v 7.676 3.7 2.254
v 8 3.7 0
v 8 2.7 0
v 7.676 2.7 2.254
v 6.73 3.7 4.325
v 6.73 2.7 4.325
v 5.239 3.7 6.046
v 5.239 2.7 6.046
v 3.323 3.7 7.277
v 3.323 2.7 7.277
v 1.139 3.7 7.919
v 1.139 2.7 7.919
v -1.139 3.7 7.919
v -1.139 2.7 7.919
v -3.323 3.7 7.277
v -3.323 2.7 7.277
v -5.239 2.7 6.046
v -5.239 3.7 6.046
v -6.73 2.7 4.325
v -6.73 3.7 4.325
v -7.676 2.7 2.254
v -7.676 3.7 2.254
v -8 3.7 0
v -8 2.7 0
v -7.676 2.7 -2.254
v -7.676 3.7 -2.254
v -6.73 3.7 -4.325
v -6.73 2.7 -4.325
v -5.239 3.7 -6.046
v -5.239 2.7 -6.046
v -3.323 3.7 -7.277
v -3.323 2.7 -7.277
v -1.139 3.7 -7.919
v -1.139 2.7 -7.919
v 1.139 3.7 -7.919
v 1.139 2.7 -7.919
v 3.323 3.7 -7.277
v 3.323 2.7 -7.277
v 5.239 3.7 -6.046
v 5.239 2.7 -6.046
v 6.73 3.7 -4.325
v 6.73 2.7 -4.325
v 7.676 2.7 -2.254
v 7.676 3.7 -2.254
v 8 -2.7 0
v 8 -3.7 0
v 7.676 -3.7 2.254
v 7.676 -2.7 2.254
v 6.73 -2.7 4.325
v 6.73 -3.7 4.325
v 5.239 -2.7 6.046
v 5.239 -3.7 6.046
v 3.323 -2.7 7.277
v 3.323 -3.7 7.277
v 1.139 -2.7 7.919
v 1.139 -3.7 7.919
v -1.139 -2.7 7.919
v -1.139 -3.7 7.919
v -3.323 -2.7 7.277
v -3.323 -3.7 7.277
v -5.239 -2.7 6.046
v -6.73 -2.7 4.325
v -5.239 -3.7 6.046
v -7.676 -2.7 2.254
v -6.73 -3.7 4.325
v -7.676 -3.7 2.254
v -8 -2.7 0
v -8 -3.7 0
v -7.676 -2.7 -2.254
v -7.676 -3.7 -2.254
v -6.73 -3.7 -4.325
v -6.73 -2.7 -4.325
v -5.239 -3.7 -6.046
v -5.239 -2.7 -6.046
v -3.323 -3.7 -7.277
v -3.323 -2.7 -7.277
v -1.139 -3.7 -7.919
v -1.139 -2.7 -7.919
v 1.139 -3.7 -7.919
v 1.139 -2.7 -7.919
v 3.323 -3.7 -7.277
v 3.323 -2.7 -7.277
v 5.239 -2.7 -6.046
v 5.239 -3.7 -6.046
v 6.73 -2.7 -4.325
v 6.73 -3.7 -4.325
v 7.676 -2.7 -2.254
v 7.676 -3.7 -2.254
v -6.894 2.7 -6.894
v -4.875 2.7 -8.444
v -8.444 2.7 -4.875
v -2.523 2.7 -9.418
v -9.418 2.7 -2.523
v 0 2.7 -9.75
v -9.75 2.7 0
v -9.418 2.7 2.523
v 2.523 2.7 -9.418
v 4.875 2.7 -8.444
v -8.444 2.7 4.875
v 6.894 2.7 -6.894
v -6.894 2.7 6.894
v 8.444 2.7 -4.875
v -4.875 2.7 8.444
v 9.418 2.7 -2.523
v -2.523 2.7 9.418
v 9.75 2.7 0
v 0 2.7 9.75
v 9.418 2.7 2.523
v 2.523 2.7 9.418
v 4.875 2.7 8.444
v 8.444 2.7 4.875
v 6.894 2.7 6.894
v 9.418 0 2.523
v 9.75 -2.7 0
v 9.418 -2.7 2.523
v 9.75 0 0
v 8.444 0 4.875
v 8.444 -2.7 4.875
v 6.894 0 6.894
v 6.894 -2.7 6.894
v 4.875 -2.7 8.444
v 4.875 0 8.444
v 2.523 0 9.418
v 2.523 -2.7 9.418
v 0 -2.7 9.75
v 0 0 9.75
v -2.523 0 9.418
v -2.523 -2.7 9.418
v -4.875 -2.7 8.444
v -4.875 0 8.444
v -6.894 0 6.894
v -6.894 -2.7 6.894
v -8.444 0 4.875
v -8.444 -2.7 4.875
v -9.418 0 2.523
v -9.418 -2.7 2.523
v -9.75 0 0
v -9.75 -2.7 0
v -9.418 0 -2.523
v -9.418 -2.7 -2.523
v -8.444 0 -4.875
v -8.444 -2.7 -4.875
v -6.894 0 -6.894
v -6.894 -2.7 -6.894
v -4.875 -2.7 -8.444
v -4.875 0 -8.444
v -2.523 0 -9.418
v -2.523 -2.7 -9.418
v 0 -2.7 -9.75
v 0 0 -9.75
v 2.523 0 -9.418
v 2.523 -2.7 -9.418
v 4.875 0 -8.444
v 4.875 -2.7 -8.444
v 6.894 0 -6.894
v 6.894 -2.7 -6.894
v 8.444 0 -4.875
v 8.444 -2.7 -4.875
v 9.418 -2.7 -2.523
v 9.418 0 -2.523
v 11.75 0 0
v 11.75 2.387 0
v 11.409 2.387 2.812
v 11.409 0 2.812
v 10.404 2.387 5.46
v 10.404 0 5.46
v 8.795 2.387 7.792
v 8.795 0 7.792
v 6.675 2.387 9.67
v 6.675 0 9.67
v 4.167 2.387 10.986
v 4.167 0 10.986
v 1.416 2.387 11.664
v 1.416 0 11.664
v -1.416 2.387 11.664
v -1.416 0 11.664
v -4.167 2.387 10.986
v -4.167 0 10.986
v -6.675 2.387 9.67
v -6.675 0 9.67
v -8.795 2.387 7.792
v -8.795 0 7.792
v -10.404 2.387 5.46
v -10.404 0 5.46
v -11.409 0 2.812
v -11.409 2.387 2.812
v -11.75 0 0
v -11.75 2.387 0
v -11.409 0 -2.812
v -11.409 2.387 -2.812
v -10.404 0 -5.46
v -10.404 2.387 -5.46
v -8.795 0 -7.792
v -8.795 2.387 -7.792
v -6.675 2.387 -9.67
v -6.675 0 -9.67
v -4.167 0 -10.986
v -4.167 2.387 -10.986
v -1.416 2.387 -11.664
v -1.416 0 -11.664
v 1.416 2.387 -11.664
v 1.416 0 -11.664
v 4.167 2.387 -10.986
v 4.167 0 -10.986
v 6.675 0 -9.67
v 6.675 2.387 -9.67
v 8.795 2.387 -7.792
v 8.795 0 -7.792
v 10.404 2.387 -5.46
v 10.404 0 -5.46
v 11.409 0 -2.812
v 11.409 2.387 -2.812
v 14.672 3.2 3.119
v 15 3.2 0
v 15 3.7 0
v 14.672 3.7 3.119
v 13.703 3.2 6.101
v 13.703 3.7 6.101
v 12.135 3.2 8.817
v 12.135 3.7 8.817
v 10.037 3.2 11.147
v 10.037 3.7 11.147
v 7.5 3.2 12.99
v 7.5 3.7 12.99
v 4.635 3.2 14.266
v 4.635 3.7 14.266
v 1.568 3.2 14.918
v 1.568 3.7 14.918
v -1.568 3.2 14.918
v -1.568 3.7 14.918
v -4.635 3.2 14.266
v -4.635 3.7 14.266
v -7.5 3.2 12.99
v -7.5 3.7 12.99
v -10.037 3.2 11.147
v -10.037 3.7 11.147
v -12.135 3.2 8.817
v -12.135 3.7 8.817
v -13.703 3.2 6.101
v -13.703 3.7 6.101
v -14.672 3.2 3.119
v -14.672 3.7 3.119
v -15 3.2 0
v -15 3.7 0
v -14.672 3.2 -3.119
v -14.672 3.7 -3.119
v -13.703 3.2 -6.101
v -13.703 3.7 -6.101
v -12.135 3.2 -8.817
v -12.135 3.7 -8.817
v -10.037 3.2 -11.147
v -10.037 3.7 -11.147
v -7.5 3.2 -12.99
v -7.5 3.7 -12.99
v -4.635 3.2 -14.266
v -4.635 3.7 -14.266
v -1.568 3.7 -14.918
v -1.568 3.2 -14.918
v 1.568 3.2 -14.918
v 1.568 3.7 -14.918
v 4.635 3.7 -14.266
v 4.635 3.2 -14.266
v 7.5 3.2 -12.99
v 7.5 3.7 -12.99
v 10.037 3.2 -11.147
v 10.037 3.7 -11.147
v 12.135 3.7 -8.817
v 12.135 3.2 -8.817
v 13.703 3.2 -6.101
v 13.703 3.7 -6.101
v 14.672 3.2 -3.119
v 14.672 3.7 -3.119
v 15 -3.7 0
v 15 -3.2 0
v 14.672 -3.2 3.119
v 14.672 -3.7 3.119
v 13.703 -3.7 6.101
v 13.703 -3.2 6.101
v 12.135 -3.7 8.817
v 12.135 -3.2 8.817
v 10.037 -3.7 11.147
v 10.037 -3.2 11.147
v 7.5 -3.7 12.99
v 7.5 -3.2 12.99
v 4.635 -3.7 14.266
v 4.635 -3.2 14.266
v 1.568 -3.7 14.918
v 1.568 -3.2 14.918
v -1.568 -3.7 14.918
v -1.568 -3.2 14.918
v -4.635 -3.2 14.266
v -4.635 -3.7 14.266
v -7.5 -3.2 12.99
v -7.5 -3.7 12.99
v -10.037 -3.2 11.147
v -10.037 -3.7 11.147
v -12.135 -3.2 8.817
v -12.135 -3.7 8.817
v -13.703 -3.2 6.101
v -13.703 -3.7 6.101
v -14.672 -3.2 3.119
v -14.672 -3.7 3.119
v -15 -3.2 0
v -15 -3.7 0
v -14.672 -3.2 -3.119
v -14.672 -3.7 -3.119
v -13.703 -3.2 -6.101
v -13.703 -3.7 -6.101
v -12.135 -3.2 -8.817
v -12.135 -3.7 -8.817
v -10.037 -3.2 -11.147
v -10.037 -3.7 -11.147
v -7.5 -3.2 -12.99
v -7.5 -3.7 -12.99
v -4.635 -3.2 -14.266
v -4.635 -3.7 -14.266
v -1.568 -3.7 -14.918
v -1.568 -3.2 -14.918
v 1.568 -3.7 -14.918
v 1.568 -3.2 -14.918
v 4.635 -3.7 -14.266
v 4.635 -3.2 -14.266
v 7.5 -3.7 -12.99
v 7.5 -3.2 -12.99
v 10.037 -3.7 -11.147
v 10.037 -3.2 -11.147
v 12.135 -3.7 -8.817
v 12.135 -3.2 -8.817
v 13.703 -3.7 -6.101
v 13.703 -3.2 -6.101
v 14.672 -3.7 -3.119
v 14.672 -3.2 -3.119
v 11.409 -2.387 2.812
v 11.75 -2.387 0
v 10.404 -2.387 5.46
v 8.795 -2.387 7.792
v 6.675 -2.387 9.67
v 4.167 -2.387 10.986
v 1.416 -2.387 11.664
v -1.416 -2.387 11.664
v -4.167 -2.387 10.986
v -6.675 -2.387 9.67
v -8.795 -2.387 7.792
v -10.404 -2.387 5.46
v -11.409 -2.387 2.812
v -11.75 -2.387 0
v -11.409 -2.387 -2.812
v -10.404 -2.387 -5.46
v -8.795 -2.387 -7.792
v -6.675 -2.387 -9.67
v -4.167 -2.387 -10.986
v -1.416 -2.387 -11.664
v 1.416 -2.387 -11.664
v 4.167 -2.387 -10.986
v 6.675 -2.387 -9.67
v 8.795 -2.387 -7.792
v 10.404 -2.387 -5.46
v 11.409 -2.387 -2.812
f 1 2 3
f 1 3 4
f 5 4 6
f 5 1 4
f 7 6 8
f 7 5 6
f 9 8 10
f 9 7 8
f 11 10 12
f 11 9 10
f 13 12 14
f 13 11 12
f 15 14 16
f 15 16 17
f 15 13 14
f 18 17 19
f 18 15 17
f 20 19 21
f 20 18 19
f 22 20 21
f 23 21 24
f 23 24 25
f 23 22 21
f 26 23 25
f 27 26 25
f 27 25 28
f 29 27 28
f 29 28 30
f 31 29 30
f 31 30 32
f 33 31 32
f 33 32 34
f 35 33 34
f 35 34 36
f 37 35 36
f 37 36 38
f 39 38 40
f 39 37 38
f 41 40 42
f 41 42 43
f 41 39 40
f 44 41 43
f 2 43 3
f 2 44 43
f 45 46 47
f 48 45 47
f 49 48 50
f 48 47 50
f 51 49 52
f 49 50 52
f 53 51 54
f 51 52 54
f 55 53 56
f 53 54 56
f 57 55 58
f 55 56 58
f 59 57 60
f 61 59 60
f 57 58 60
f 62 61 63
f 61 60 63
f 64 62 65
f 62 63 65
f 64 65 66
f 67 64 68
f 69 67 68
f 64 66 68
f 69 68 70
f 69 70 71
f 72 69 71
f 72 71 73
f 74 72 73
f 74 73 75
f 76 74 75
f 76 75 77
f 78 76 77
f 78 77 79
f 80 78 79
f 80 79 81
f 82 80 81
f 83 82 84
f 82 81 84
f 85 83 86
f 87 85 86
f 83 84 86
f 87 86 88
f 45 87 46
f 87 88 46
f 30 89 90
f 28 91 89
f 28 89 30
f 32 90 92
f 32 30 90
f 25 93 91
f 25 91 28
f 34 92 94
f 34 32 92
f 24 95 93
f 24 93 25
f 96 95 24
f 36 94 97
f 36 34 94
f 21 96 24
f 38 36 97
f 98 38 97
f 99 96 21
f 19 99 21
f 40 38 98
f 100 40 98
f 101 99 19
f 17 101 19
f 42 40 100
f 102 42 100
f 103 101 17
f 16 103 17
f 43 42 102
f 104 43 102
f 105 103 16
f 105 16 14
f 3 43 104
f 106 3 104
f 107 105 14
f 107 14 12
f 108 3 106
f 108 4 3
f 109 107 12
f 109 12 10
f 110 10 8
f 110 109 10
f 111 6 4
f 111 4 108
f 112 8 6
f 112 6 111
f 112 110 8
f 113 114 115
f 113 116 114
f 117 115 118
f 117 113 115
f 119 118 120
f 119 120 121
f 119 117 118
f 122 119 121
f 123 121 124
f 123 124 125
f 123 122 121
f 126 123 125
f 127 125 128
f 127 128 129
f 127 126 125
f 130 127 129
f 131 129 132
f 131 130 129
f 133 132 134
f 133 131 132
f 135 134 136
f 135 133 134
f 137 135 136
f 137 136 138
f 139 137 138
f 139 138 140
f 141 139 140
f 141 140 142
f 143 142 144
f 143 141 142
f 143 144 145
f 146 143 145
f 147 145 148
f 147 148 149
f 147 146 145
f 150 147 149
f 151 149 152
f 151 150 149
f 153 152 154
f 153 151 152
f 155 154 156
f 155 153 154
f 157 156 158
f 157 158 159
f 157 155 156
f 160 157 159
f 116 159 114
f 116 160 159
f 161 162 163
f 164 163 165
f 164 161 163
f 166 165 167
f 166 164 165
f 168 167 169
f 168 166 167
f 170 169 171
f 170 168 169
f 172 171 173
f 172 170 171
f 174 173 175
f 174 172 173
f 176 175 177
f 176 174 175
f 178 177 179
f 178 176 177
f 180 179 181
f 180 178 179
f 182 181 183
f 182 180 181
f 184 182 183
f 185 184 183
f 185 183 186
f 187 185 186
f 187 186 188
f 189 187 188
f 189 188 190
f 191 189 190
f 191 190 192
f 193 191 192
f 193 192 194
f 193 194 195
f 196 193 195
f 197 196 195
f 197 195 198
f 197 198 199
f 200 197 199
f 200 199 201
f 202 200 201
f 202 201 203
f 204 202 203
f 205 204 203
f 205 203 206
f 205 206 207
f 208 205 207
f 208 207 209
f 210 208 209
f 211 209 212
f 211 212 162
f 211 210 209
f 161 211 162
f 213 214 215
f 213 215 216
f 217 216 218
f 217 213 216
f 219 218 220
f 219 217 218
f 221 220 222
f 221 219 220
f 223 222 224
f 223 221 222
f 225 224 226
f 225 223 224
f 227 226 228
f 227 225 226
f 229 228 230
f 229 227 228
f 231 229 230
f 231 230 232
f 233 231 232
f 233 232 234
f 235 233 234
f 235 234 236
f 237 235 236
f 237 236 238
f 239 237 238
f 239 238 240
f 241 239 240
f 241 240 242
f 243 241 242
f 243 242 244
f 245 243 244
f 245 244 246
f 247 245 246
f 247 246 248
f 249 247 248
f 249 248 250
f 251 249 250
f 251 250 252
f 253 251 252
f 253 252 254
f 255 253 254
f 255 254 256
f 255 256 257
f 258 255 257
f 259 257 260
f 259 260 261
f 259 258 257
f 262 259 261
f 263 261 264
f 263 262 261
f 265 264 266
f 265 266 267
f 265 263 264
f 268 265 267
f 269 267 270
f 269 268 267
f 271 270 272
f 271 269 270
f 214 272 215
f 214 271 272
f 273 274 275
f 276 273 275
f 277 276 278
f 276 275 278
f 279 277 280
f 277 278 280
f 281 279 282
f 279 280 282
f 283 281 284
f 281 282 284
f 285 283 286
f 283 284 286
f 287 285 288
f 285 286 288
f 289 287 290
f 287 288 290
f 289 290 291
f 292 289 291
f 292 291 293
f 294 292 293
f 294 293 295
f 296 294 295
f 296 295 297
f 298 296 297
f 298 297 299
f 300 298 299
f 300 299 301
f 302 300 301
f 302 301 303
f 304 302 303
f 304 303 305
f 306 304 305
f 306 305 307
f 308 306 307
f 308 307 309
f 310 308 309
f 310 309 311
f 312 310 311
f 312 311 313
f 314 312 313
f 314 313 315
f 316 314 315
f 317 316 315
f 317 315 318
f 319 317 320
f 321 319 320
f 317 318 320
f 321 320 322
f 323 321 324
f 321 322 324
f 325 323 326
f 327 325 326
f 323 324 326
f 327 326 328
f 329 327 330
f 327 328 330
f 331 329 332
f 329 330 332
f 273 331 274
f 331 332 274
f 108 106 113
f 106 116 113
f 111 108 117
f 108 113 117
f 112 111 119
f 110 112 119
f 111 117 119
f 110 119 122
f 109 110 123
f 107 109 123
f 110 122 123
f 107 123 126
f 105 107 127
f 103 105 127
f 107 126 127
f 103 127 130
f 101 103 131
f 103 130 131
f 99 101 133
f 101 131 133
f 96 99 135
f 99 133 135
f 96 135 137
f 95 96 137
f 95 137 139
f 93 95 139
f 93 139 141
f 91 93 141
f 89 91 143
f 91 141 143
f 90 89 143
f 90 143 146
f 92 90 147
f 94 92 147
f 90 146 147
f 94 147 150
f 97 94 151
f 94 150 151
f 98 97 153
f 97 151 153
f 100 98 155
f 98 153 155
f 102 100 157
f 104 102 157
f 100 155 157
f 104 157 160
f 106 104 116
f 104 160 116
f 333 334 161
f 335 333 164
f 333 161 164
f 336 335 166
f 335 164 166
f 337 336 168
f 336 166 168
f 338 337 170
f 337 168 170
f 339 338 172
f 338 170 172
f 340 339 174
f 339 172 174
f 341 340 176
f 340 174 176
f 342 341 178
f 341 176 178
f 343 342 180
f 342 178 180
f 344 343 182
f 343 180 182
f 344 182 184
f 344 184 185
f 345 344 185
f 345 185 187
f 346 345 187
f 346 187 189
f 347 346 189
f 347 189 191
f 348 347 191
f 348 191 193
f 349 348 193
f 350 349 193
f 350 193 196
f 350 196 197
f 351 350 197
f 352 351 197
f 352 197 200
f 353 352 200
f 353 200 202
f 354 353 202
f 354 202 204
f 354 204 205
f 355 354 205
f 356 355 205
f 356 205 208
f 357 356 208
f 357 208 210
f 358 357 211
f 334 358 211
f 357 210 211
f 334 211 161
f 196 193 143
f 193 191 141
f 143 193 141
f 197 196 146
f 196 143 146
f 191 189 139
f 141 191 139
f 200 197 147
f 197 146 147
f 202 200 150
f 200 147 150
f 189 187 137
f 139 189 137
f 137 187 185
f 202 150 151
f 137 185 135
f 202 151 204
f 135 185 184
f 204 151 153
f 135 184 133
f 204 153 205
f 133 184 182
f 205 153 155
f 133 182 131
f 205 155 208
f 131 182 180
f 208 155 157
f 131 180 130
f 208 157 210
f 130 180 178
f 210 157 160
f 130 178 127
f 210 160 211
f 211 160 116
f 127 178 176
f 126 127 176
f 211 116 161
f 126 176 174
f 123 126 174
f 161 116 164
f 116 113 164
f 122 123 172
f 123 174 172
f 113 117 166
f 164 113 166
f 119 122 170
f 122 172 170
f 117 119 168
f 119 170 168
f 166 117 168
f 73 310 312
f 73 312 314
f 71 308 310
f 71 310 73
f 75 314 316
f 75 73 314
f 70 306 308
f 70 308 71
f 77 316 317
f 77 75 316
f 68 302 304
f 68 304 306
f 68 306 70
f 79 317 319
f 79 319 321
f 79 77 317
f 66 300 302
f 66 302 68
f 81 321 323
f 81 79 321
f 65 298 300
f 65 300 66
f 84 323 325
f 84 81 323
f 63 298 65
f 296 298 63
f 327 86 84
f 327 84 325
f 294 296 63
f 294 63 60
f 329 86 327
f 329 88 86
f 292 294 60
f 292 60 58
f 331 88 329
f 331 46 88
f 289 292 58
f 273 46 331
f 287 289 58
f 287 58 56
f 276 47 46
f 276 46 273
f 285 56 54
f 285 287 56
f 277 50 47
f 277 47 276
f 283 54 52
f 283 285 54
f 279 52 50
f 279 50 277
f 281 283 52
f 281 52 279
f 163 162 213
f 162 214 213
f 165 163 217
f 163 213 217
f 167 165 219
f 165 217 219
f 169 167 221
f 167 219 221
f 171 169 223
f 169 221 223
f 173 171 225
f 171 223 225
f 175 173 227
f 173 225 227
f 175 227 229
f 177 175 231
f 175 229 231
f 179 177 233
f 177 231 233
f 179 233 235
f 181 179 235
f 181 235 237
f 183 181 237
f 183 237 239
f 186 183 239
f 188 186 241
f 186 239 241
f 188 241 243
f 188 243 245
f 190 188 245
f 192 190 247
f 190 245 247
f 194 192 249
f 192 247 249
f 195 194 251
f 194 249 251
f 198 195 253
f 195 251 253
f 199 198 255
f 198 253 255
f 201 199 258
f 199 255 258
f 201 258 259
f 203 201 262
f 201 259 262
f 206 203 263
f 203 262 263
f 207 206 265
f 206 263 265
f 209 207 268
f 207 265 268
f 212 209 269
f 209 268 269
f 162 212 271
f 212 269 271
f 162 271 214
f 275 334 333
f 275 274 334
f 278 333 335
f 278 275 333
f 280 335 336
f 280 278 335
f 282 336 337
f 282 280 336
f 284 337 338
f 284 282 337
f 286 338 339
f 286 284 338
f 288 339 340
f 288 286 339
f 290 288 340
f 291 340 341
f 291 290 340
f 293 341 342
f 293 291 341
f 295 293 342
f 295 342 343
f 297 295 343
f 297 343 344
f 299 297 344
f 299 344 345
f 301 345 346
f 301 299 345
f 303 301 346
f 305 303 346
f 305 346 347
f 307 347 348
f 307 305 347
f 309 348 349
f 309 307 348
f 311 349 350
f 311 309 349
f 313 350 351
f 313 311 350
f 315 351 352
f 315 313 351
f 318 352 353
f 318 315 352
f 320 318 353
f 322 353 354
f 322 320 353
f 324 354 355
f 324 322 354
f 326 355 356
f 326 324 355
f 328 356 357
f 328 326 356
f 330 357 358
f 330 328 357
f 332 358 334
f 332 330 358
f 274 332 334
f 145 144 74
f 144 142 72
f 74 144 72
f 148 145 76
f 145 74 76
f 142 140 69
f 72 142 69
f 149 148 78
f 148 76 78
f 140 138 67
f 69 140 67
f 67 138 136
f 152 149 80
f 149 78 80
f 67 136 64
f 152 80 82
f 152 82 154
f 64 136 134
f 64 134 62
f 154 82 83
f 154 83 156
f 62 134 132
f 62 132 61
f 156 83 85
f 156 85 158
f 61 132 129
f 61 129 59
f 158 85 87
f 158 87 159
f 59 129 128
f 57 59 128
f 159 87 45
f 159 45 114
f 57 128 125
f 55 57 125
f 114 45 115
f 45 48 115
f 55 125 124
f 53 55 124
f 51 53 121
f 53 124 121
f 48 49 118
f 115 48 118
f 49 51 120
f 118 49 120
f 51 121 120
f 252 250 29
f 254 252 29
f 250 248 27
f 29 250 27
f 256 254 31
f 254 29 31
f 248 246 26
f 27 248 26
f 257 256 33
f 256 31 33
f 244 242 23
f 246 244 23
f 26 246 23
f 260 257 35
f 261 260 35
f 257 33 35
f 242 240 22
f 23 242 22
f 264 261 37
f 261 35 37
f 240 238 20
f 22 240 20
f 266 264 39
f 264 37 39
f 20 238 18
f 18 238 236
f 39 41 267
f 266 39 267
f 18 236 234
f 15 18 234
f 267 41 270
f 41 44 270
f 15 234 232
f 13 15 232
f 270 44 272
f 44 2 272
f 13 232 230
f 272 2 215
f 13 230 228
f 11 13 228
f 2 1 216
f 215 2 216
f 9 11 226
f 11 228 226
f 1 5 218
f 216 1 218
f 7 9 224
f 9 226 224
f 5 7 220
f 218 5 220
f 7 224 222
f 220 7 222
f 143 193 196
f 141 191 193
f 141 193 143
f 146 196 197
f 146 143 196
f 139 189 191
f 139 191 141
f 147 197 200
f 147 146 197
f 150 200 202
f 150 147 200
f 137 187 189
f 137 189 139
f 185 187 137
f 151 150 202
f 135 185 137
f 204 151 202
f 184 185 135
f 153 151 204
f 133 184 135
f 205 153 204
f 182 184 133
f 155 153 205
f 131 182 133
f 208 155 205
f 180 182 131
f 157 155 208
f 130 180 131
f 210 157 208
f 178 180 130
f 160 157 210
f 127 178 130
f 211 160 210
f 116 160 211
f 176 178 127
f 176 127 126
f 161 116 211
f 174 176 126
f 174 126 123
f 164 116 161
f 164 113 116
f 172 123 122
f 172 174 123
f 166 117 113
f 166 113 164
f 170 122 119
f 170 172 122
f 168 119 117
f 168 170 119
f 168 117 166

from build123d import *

# Parameters (mm, degrees)
F0_R        = 11.75
F0_R_2      = 9.75
F1_DEPTH    = 1.2
F2_R        = 15
F2_R_2      = 11.75
F2_R_3      = 9.75
F3_DEPTH    = 2.5
F4_S5_R     = 11.75
F4_T6_DEPTH = 23
F5_R        = 9.75
F5_R_2      = 8
F6_DEPTH    = 1


# Not quite as in the source:
# - a fillet or chamfer that OpenCascade refuses, or shapes differently, is made with other operations: its cross-section is extruded or revolved along the edge and cut away or added


with BuildPart() as f1:
    # F0 (on Front) → F1 (new body)
    with BuildSketch(Plane.XZ):
        Circle(F0_R)
        Circle(F0_R_2, mode=Mode.SUBTRACT)
    extrude(amount=F1_DEPTH)

    # F2 (on face) → F3 (join)
    with BuildSketch(Plane.XZ.offset(1.2)):
        Circle(F2_R)
        Circle(F2_R_2, mode=Mode.SUBTRACT)
        Circle(F2_R_2)
        Circle(F2_R_3, mode=Mode.SUBTRACT)
    extrude(amount=F3_DEPTH)

    # F4: chamfer of 2 x 8 on 1 edges, made by hand


with BuildPart() as f4_tool2:
    # F4_s3 → F4_t4 (revolve)
    with BuildSketch(Plane.XY):
        Polygon((7, -1.2), (15, -3.2), (15, -1.2), align=None)
    revolve(axis=Axis((0, -1.2, 0), (0, -1, 0)))

    # F4_s5 → F4_t6 (cut, symmetric)
    with BuildSketch(Plane.XZ.offset(2.2)):
        Circle(F4_S5_R)
    extrude(amount=F4_T6_DEPTH, both=True, mode=Mode.SUBTRACT)


with BuildPart() as f1_1:
    add(f1.part)

    # F4_t1: cut F4_tool2
    add(f4_tool2.part, mode=Mode.SUBTRACT)

    # F5 (on face) → F6 (join)
    with BuildSketch(Plane.XZ.offset(3.7)):
        Circle(F5_R)
        Circle(F5_R_2, mode=Mode.SUBTRACT)
    extrude(amount=-F6_DEPTH)


with BuildPart() as f7_1:
    # F7: instance of F1
    add(f1_1.part.mirror(Plane(origin=(0, 0, 0), x_dir=(1, 0, 0), z_dir=(0, 1, 0))))


solid = Compound([f1_1.part, f7_1.part])
